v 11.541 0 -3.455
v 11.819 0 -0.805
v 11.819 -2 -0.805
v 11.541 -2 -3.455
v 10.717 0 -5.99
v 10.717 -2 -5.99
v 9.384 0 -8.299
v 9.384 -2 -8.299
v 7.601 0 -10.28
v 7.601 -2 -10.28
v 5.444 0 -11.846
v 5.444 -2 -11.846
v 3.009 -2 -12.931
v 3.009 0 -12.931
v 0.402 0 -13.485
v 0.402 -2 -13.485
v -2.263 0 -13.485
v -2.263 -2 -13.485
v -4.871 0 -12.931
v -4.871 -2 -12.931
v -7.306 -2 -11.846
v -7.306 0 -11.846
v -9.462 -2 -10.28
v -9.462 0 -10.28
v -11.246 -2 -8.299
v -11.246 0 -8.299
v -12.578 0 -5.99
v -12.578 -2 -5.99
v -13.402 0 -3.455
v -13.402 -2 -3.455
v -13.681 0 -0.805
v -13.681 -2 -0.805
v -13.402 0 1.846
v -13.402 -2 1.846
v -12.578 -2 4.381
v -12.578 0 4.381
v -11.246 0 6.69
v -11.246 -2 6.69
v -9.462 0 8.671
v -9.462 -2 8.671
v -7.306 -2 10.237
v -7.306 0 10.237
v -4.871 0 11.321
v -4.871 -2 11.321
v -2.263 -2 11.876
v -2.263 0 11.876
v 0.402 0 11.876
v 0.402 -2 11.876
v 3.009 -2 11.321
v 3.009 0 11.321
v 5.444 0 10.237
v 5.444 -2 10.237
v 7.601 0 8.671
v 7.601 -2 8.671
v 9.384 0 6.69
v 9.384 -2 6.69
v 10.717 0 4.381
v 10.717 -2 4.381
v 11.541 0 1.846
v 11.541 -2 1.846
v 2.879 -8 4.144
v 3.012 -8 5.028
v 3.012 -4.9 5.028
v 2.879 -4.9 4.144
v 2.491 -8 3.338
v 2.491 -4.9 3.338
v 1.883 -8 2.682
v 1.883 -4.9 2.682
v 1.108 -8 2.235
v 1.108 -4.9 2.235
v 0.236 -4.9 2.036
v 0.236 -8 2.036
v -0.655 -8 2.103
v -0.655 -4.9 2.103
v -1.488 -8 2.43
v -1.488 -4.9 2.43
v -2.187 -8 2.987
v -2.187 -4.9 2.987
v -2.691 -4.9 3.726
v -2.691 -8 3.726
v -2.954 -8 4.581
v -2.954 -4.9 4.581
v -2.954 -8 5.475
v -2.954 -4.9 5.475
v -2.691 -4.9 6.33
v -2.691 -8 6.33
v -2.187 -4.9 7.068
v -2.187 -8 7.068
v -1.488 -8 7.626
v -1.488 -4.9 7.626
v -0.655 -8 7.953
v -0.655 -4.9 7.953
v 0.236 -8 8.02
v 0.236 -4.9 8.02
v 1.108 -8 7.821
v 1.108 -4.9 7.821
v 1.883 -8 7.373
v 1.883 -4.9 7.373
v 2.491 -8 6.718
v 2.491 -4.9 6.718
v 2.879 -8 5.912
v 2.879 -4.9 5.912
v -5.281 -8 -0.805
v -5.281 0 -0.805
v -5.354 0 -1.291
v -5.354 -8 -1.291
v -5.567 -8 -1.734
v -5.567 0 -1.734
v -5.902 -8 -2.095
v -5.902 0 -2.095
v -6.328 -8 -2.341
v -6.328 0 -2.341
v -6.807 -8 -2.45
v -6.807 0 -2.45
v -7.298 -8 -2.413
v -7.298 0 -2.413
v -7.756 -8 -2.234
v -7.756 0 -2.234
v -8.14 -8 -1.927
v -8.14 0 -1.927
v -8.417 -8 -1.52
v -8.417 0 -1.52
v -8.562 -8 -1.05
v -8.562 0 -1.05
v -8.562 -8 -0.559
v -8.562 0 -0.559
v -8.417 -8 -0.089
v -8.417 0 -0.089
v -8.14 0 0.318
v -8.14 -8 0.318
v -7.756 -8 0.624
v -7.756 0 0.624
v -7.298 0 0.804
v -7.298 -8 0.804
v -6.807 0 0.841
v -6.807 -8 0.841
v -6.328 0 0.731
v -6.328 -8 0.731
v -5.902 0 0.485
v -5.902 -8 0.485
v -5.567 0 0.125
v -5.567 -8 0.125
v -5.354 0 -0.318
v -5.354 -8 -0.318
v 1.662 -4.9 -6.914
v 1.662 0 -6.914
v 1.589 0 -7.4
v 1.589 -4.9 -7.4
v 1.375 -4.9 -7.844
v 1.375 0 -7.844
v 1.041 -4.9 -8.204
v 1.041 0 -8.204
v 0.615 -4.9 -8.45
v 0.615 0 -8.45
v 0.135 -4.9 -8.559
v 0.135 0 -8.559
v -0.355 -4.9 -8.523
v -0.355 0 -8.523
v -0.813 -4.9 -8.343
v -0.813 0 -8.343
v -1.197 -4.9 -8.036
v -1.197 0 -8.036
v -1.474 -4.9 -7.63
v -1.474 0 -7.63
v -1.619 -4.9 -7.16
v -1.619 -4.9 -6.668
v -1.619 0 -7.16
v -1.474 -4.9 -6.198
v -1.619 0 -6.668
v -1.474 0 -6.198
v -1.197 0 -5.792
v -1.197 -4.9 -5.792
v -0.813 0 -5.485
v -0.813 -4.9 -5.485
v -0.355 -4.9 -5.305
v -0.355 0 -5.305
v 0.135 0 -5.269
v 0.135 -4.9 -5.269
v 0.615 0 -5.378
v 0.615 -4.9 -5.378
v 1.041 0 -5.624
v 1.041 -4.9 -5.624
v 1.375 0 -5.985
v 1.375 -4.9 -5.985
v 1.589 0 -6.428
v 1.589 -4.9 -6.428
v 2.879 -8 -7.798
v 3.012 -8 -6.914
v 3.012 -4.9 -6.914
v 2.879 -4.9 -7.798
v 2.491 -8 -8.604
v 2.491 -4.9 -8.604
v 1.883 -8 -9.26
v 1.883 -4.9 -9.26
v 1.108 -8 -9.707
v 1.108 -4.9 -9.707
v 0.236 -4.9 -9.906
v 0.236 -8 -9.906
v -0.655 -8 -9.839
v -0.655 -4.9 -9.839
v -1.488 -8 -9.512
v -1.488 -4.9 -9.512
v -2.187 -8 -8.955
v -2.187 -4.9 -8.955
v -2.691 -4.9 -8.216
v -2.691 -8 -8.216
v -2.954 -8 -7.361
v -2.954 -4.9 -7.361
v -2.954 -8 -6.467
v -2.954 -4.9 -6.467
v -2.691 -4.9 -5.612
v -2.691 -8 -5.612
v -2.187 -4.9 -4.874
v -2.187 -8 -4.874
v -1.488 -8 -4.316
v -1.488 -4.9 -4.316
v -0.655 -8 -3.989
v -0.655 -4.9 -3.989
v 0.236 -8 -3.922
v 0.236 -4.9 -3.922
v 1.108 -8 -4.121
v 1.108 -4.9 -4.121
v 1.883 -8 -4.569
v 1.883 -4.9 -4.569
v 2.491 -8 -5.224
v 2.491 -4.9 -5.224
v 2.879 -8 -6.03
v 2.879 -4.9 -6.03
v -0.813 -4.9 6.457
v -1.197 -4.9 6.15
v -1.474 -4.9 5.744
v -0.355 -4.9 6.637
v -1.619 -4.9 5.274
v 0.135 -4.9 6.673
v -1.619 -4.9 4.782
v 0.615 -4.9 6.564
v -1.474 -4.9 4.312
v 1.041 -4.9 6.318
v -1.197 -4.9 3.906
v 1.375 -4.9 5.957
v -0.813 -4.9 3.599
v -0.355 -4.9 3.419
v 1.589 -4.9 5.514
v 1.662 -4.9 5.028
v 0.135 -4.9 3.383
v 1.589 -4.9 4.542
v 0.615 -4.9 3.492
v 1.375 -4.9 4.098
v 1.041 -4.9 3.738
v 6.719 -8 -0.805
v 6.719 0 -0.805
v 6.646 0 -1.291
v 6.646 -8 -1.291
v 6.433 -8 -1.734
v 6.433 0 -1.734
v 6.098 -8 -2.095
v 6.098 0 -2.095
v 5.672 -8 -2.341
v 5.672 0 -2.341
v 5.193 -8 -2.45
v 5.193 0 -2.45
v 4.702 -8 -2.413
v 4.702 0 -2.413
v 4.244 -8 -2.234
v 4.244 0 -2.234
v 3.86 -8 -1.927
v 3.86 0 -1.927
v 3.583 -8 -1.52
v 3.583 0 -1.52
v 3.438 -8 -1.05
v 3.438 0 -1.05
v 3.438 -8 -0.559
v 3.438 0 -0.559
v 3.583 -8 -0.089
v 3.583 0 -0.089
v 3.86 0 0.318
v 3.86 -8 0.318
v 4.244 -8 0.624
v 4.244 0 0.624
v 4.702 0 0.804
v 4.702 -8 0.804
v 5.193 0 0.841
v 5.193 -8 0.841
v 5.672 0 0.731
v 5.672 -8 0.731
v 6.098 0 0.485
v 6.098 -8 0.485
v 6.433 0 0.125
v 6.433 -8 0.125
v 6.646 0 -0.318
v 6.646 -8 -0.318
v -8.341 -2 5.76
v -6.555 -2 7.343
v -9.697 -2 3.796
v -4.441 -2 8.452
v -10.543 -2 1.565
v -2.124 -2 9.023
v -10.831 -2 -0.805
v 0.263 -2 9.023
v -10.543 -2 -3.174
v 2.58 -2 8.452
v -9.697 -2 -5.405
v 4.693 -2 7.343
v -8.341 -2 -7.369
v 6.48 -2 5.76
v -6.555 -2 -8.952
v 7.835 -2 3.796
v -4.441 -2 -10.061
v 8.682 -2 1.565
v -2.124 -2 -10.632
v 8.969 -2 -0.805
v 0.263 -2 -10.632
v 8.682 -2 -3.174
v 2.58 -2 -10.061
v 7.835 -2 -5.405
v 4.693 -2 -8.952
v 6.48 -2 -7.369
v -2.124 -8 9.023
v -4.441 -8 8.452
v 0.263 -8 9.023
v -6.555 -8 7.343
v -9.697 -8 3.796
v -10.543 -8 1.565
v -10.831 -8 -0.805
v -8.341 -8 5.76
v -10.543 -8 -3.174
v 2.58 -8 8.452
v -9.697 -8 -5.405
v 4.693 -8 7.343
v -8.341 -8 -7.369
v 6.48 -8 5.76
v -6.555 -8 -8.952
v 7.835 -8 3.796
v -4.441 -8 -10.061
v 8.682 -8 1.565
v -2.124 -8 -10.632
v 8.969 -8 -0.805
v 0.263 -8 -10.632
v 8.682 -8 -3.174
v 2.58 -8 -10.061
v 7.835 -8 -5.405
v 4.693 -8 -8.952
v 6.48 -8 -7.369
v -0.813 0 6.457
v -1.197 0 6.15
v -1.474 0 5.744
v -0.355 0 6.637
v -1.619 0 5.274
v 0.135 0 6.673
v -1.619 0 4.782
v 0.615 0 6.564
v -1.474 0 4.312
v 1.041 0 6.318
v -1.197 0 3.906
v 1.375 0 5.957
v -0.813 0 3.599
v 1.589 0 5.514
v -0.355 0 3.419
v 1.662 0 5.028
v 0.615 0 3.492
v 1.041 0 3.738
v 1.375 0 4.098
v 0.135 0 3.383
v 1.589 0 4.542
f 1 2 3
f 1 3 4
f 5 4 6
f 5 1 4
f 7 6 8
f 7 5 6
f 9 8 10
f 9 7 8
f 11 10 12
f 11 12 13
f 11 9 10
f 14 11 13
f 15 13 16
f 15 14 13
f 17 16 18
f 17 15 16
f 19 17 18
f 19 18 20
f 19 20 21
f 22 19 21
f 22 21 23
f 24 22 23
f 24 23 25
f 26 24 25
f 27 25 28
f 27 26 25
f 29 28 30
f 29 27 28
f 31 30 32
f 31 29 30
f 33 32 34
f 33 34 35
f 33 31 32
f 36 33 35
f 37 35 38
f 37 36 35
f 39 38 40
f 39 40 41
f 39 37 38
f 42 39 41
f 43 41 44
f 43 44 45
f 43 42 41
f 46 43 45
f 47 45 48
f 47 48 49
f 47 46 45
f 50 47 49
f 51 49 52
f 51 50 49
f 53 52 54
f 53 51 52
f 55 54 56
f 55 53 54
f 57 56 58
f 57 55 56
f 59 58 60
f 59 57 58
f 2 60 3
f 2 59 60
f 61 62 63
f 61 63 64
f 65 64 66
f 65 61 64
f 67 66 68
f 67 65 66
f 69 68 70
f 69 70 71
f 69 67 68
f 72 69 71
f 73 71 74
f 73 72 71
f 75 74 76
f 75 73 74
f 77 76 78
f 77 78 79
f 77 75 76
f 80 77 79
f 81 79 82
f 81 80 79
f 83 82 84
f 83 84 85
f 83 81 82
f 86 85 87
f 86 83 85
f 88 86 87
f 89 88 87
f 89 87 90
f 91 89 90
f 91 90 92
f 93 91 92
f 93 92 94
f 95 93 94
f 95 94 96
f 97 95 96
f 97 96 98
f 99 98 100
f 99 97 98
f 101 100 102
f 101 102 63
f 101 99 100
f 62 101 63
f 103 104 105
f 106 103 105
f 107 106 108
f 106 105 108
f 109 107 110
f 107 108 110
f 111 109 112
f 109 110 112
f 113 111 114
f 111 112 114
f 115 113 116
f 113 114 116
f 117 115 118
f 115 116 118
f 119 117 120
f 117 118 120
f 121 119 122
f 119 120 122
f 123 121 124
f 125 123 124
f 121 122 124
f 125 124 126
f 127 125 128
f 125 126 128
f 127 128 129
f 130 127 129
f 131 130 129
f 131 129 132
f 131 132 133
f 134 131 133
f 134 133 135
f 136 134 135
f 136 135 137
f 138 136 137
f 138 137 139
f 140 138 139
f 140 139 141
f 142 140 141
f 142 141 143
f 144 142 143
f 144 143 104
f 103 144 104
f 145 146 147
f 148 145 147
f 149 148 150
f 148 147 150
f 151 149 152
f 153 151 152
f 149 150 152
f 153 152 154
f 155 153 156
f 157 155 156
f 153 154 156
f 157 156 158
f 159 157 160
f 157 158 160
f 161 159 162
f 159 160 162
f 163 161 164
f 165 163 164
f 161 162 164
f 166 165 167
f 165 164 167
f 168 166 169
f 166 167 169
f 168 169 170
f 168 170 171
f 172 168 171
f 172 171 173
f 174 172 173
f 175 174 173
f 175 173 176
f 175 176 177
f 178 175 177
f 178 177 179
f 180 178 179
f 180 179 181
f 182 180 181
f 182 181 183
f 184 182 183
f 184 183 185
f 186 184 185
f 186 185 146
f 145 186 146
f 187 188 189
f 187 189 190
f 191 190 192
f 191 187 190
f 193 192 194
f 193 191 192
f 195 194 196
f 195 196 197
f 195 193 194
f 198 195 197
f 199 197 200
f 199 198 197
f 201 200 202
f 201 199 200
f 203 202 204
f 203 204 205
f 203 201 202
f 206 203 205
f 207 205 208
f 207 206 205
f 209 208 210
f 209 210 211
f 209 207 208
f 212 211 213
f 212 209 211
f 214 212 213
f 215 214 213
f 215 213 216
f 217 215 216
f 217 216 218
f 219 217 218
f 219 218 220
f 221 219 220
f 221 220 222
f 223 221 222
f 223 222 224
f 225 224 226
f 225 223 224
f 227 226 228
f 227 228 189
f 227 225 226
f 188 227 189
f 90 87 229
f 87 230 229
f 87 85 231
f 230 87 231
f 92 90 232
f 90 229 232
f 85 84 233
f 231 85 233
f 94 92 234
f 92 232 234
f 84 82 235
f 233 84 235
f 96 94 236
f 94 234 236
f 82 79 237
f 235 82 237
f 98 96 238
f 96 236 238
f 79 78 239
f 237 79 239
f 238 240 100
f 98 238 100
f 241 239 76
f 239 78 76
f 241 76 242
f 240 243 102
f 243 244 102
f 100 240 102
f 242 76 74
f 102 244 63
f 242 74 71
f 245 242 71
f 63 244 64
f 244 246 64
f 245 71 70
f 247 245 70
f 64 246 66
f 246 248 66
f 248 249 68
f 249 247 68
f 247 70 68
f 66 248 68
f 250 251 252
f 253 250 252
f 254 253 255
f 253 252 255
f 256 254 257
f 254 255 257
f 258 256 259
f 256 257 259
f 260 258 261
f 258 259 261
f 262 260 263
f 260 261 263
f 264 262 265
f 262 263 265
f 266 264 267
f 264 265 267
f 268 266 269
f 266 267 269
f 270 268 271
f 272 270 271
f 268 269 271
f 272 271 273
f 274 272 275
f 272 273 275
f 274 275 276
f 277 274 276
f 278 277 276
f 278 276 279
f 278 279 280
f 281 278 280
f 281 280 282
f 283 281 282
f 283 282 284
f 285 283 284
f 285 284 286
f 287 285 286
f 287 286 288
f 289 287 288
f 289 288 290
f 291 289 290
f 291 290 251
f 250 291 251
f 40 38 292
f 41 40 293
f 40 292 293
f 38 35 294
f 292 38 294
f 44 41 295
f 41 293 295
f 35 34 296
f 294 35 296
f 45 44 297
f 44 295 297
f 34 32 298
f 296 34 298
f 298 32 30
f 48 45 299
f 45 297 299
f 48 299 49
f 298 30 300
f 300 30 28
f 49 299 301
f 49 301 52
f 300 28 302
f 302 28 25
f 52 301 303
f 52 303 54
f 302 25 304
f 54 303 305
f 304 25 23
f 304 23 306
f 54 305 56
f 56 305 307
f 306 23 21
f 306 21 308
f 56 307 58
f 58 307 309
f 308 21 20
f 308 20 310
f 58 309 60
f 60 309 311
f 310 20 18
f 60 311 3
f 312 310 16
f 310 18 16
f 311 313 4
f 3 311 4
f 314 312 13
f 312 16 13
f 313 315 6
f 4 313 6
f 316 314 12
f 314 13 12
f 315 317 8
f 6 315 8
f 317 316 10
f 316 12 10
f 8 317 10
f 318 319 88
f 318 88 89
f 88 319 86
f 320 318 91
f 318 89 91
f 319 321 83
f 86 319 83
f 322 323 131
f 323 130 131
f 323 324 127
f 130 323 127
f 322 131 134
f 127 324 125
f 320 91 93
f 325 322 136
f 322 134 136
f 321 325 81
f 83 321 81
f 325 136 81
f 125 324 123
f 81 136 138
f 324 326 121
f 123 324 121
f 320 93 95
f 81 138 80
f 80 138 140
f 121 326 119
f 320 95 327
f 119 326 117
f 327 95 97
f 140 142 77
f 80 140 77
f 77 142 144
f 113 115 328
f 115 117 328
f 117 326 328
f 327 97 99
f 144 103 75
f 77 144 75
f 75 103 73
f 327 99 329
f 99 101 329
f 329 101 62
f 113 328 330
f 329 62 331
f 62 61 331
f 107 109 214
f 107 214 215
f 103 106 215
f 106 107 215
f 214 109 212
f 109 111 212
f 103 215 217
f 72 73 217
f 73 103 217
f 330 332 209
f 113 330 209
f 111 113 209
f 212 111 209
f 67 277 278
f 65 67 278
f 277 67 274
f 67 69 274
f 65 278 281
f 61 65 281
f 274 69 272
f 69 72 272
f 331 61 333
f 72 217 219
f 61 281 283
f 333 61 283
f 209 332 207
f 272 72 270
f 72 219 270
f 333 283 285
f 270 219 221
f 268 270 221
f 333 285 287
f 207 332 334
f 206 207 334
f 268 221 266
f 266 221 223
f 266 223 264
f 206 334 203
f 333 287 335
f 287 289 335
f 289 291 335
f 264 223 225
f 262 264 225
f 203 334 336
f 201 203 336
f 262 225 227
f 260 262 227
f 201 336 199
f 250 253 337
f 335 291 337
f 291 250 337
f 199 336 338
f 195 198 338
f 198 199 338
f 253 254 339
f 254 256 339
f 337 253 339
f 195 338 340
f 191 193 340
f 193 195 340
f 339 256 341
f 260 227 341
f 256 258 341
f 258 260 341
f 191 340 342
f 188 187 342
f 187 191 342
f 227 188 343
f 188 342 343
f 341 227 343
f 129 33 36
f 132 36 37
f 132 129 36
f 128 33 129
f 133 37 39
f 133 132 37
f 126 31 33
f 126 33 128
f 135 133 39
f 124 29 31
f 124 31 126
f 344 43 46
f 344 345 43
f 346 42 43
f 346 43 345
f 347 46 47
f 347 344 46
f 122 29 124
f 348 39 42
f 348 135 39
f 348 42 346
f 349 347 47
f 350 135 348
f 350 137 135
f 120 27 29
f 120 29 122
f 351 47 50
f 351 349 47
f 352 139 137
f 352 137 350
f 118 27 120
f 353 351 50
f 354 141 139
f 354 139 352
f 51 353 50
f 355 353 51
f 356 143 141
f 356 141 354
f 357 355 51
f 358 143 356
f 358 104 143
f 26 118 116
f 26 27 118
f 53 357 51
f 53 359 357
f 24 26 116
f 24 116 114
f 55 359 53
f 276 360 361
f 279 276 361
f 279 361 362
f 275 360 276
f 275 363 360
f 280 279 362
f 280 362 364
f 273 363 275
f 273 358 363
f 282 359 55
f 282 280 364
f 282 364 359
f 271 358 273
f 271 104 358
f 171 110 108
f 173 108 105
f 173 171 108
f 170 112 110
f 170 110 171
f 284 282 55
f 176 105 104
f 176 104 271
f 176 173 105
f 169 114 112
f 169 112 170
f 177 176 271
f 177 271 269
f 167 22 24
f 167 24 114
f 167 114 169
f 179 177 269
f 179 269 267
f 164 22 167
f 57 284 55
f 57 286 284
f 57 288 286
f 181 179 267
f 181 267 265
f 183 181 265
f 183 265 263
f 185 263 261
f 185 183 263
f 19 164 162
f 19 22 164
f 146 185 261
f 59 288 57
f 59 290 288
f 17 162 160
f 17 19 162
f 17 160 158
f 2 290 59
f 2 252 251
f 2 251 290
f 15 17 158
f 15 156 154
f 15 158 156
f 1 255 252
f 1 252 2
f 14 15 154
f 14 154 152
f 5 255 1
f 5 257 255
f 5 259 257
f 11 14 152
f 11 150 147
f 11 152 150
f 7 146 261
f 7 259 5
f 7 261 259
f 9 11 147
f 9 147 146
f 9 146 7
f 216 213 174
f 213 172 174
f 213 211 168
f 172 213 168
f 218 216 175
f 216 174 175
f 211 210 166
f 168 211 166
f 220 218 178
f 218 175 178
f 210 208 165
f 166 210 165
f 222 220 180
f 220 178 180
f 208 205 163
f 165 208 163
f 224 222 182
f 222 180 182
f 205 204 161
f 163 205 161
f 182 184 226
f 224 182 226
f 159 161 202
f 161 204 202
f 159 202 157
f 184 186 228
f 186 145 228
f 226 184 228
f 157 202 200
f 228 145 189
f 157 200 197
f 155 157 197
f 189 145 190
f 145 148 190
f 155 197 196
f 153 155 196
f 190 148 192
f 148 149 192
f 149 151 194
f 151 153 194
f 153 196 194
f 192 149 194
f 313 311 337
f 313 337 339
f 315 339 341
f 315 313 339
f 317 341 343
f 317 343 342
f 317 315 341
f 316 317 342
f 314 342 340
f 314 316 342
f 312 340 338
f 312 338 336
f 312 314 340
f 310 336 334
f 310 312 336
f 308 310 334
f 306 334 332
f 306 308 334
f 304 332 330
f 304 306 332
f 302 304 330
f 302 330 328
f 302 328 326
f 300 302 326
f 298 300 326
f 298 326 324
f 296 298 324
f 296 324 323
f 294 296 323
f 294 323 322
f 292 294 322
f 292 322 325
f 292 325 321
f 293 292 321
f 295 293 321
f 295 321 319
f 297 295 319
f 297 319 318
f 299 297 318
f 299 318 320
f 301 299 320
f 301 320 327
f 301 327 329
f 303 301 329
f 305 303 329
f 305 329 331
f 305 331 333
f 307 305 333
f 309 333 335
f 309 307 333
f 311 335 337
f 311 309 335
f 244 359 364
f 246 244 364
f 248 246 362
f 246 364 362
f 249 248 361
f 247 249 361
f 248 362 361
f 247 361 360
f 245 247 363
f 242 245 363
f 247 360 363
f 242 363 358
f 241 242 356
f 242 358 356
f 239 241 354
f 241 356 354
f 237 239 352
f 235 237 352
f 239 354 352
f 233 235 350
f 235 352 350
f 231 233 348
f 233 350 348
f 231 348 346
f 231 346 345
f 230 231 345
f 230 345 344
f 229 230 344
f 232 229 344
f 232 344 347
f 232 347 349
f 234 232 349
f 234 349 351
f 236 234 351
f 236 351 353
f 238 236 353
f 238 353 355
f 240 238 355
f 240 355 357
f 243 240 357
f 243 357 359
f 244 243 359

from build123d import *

# Parameters (mm, degrees)
SKETCH2_R           = 9.9
BOSS_EXTRUDE1_DEPTH = 8
SKETCH2_3_R         = 12.75
BOSS_EXTRUDE2_DEPTH = 2
SKETCH2_4_R         = 1.65
CUT_EXTRUDE1_DEPTH  = 9
CUT_EXTRUDE2_START  = -8
SKETCH2_5_R         = 3
CUT_EXTRUDE2_DEPTH  = 3.1


with BuildPart() as part:
    # Sketch2 → Boss-Extrude1 (new body)
    with BuildSketch(Plane(origin=(0, 0, 0), x_dir=(1, 0, 0), z_dir=(0, 1, 0))):
        with Locations((-0.930712346, 0.804578045)):
            Circle(SKETCH2_R)
    extrude(amount=-BOSS_EXTRUDE1_DEPTH)

    # Sketch2<3> → Boss-Extrude2 (add)
    with BuildSketch(Plane(origin=(0, 0, 0), x_dir=(1, 0, 0), z_dir=(0, 1, 0))):
        with Locations((-0.930712346, 0.804578045)):
            Circle(SKETCH2_3_R)
    extrude(amount=-BOSS_EXTRUDE2_DEPTH)

    # Sketch2<4> → Cut-Extrude1 (cut, through all)
    with BuildSketch(Plane(origin=(0, 0, 0), x_dir=(1, 0, 0), z_dir=(0, 1, 0))):
        with Locations((0.012181629, 6.914065552)):
            Circle(SKETCH2_4_R)
        with Locations((0.012181629, -5.027976136)):
            Circle(SKETCH2_4_R)
        with Locations((-6.930712346, 0.804578045)):
            Circle(SKETCH2_4_R)
        with Locations((5.069287654, 0.804578045)):
            Circle(SKETCH2_4_R)
    extrude(amount=-CUT_EXTRUDE1_DEPTH, mode=Mode.SUBTRACT)

    # Sketch2<5> → Cut-Extrude2 (cut)
    with BuildSketch(Plane(origin=(0, 0, 0), x_dir=(1, 0, 0), z_dir=(0, 1, 0)).offset(CUT_EXTRUDE2_START)):
        with Locations((0.012181629, 6.914065552)):
            Circle(SKETCH2_5_R)
        with Locations((0.012181629, -5.027976136)):
            Circle(SKETCH2_5_R)
    extrude(amount=CUT_EXTRUDE2_DEPTH, mode=Mode.SUBTRACT)


solid = part.part
